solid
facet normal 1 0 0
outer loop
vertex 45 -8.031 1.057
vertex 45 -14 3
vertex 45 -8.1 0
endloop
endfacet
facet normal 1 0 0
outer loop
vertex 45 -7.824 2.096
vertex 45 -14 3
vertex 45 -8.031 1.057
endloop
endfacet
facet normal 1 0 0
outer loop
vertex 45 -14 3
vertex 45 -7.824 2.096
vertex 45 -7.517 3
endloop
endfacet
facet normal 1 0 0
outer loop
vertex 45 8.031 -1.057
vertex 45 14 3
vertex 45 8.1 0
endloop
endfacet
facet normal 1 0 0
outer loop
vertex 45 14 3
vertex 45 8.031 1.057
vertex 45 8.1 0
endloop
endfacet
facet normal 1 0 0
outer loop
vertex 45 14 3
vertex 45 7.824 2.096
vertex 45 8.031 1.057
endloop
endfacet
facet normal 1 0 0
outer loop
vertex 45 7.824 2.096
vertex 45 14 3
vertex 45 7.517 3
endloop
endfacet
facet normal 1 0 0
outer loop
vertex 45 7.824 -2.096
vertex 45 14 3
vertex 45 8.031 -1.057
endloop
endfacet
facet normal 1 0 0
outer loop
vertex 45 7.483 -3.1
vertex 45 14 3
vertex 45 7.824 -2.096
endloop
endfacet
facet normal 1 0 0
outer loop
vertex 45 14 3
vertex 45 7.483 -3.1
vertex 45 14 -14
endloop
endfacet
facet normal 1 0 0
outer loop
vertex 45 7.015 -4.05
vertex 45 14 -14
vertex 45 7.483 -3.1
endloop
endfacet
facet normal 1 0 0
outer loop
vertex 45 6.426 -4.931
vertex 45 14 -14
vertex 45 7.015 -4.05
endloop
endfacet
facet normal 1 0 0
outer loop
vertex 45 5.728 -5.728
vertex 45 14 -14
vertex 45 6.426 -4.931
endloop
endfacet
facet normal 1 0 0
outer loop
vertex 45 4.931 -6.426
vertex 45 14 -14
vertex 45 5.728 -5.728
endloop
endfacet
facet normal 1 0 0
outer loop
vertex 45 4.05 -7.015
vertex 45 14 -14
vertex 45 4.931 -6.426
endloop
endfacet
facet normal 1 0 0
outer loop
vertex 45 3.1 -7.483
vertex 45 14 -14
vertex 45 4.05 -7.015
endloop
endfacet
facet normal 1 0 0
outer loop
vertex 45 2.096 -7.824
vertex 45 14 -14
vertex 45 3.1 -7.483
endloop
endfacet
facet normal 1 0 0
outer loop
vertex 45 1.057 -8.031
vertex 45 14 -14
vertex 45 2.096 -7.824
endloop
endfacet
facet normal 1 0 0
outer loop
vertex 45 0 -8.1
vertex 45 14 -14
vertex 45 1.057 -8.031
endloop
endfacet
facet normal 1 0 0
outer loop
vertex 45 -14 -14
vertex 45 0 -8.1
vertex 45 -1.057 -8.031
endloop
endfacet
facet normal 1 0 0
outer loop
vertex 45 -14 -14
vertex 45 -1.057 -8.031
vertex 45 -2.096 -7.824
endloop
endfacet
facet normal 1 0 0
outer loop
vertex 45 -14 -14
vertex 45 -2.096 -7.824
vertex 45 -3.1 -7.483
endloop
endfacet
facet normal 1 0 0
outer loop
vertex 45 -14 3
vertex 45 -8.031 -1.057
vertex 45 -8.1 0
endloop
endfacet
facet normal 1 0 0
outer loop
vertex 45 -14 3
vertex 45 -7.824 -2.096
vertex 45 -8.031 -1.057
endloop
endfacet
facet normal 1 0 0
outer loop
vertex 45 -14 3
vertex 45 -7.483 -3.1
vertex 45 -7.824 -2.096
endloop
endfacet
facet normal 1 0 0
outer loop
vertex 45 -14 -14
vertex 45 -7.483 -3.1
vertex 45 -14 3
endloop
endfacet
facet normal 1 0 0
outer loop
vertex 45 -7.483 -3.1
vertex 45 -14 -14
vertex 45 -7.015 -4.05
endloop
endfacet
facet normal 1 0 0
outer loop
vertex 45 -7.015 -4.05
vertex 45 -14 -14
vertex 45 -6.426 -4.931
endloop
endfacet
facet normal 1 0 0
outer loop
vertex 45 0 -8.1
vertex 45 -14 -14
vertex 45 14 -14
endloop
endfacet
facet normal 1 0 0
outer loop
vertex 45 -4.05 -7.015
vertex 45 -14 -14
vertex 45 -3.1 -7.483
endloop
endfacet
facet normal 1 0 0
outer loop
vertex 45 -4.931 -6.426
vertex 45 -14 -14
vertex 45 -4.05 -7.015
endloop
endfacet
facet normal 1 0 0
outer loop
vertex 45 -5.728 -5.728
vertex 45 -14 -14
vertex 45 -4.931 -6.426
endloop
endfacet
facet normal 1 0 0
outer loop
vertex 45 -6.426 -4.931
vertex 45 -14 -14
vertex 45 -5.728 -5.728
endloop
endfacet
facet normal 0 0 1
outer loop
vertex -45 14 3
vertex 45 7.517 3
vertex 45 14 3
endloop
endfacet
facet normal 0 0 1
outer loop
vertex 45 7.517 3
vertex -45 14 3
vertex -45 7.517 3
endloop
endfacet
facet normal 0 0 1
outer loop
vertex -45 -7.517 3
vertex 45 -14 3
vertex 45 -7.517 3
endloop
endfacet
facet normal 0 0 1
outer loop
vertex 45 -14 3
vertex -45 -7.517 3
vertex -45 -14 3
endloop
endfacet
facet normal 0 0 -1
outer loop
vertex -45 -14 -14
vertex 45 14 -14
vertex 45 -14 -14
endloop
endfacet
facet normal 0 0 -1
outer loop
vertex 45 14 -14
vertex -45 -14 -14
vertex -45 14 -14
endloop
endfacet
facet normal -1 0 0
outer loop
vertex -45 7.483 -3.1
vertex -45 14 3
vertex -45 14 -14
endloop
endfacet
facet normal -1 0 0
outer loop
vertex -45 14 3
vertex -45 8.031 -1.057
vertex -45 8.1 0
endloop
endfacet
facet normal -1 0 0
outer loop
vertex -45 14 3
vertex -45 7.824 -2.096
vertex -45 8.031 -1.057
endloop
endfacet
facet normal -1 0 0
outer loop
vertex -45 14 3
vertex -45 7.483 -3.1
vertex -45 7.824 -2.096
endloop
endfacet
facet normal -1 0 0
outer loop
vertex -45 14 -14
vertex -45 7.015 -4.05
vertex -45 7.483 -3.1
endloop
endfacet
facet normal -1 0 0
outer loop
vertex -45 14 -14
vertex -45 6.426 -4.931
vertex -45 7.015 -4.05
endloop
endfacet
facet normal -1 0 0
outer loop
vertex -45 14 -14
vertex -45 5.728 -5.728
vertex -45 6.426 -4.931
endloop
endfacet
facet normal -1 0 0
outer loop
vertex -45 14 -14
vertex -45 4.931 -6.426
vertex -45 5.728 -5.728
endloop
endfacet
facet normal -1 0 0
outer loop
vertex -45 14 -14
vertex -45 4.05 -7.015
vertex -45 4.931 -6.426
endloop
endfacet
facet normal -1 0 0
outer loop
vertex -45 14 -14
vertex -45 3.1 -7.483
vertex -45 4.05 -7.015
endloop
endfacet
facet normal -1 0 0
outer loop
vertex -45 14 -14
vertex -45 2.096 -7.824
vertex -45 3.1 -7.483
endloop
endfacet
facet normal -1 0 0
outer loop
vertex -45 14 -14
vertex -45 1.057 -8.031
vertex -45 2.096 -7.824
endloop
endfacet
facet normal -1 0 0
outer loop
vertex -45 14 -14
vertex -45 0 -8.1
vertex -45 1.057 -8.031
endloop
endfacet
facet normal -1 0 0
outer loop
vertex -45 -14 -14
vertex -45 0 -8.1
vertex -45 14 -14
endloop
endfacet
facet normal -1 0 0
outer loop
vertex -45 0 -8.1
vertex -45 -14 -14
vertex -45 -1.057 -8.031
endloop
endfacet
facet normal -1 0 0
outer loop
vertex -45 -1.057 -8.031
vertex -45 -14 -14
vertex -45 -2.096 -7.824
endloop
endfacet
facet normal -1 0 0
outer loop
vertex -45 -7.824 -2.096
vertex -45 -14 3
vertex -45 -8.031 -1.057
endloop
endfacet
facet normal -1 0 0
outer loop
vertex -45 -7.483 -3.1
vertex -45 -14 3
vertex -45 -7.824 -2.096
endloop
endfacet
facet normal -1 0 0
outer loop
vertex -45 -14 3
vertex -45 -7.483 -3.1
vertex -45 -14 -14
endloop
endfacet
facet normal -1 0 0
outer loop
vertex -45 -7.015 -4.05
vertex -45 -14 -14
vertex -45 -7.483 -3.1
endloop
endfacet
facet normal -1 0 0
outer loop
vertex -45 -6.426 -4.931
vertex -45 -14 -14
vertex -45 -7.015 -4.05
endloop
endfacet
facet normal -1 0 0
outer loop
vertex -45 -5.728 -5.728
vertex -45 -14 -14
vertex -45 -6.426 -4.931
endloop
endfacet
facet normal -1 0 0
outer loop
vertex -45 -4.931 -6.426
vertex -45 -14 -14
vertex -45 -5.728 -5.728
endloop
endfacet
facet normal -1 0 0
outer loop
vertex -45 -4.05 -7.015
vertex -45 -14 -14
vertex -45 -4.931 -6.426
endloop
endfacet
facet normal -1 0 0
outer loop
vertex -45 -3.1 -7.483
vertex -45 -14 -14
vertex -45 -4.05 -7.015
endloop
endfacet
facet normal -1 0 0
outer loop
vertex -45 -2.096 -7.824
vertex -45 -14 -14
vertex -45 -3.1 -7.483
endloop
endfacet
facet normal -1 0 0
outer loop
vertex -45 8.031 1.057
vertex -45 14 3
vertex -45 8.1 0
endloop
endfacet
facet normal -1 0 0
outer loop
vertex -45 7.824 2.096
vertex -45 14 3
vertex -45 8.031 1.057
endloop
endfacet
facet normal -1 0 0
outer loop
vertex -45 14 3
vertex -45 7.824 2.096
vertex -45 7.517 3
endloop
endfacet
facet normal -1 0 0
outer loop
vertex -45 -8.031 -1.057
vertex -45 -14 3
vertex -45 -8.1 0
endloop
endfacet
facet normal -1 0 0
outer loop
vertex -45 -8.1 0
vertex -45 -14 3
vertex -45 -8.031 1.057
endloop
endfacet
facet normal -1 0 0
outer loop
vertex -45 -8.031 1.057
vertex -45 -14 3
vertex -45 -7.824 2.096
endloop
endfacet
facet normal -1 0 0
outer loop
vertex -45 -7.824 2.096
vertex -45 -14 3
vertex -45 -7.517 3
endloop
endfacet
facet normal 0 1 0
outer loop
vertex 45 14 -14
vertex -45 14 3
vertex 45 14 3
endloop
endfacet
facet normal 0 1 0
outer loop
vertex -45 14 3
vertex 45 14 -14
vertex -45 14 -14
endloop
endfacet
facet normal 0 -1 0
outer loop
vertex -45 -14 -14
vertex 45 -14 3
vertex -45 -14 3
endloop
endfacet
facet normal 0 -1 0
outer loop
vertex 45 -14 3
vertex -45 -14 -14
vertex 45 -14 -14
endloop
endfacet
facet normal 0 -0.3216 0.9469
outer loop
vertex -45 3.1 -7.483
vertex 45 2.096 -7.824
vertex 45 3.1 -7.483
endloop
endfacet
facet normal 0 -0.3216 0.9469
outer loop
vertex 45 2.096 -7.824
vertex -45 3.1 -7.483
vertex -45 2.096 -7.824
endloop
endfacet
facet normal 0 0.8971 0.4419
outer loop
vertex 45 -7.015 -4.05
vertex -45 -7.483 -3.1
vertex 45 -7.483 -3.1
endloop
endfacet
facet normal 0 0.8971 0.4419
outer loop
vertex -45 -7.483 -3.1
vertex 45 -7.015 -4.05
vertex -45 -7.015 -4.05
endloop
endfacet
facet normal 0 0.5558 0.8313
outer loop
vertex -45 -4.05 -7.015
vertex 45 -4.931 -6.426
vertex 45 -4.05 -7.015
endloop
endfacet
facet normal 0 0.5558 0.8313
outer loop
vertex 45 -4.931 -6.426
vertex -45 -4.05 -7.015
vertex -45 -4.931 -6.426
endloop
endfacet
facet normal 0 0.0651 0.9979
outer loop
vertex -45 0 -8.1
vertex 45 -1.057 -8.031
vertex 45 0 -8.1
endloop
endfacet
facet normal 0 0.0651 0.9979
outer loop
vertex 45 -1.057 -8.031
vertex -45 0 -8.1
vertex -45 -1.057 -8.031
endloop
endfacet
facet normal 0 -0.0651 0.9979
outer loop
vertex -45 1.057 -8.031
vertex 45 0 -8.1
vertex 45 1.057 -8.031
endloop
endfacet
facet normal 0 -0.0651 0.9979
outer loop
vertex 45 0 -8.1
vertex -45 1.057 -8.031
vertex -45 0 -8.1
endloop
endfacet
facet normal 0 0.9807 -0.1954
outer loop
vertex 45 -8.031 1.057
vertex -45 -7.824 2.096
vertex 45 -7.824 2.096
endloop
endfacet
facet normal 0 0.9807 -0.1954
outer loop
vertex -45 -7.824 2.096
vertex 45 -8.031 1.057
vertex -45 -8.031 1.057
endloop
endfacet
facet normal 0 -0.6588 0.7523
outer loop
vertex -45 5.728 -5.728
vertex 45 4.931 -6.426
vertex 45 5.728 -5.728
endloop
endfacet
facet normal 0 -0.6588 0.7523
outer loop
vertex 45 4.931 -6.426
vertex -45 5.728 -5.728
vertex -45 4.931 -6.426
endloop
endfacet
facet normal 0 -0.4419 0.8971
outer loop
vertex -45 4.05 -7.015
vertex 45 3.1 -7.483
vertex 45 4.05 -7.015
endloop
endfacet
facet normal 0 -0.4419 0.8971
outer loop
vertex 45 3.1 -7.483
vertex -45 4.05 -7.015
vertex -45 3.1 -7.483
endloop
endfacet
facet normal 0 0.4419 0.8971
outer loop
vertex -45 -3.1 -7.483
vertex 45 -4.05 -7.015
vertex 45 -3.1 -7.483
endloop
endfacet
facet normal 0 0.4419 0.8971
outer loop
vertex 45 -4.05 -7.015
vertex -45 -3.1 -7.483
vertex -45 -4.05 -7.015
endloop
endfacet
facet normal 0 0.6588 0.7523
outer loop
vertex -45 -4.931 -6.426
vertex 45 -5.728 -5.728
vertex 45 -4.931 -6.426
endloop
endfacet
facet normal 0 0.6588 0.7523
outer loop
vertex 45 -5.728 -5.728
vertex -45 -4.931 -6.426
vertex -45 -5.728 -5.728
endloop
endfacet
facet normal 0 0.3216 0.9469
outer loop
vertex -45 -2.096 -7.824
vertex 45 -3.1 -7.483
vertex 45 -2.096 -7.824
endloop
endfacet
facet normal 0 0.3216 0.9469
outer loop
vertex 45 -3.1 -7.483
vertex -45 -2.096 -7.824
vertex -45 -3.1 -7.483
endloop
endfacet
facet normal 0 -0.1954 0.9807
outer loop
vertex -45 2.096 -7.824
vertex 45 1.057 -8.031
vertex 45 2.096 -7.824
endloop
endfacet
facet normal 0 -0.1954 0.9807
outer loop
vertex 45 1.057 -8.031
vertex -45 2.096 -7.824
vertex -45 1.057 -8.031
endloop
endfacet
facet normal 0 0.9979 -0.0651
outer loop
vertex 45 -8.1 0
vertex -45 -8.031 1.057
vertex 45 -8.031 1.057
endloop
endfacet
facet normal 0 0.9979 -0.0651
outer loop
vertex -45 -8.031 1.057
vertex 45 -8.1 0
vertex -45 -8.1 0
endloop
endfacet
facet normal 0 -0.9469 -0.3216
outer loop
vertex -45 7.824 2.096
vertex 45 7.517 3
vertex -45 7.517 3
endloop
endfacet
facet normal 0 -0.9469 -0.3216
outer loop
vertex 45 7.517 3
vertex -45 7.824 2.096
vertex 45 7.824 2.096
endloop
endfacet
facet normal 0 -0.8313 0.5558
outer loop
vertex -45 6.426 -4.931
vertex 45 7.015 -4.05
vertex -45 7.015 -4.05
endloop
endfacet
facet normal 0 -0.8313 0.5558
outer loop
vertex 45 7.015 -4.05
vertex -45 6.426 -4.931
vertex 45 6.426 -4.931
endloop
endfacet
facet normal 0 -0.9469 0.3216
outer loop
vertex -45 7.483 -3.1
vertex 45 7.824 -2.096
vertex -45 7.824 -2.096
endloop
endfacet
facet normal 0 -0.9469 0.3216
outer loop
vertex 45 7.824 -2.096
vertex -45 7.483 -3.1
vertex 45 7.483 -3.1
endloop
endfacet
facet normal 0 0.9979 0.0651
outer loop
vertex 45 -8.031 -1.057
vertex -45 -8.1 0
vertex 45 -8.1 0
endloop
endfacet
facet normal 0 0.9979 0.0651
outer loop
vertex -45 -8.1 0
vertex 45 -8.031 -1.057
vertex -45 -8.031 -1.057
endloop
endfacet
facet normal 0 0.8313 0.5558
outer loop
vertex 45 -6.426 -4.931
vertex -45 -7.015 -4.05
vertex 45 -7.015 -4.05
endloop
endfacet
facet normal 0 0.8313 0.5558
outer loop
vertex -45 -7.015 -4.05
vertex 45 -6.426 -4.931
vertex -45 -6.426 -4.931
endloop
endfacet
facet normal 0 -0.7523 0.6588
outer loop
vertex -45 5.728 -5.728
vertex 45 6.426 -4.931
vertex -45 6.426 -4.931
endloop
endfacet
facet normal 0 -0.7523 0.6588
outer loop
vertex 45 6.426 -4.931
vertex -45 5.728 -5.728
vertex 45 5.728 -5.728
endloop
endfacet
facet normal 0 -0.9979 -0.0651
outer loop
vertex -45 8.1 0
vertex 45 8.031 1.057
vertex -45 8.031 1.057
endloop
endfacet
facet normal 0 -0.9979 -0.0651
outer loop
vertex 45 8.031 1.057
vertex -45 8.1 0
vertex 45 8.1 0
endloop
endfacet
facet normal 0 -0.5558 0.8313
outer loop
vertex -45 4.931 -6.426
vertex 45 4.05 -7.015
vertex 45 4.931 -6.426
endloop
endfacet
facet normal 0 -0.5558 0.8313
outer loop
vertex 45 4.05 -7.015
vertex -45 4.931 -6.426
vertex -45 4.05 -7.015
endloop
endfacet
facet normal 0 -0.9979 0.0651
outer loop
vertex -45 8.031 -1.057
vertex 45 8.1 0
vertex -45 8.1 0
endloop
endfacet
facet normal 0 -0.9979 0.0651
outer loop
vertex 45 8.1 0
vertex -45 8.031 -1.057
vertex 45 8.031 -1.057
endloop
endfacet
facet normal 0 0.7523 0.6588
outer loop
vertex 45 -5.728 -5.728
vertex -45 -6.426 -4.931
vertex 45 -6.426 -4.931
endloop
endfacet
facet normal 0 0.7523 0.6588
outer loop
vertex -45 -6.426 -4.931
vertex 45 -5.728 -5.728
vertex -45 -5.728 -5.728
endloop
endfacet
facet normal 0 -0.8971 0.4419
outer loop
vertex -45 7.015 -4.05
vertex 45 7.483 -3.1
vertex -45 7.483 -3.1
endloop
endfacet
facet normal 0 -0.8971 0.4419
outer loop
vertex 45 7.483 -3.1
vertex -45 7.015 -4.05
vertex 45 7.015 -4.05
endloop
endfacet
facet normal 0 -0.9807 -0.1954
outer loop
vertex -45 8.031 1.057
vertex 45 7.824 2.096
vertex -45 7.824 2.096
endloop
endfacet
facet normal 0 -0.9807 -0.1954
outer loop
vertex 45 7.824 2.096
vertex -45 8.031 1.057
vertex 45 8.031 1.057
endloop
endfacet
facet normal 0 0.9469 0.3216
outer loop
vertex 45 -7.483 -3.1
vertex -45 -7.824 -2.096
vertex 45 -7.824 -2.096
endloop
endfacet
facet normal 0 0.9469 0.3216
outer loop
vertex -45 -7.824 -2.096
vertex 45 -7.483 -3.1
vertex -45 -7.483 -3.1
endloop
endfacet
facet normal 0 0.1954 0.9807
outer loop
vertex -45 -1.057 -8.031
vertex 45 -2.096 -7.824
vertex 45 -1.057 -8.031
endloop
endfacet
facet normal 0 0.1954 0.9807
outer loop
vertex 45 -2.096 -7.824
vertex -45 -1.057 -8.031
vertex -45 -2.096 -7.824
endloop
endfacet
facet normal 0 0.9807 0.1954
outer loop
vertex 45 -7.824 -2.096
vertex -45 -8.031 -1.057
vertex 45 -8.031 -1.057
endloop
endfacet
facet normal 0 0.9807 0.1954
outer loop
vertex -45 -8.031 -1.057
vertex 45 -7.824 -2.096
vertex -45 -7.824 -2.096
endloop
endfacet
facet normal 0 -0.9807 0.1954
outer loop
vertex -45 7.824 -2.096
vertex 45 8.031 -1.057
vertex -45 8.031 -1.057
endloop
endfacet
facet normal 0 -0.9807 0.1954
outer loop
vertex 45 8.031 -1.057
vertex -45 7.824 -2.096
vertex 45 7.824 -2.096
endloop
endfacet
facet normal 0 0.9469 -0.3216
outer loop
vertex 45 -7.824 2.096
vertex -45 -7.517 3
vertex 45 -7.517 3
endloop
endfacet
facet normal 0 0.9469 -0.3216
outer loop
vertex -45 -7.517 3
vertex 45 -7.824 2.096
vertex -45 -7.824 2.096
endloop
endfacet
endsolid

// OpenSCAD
// file: ../common/ds_lib.scad
// DronSwarm · librería común de piezas del frame (S07-S08). Unidades: mm.
//
// Reglas (ADR-003): sin hull()/minkowski()/offset() — FreeCAD los convierte en malla y el STEP deja de ser un
// sólido válido. Las formas redondeadas se arman con uniones de cubos y cilindros. El importador CSG de FreeCAD
// también falla con booleanas 2D y con varios operandos agrupados bajo una sola transformación: cada grupo de
// agujeros debe ser hijo directo del difference(), con su propio translate.
//
// Interfaz de motor DronSwarm (DMI, ADR-011): placa con 4 ranuras radiales a 90°, de modo que el mismo soporte
// acepta varios patrones comerciales y, más adelante, el motor propio (S17+) se diseña para caer en el mismo rango.
//   DMI-S: 4×M3, círculo de tornillos Ø16-Ø25 (motores 28xx-41xx, ≤ 600 W)
//   DMI-L: 4×M4, círculo de tornillos Ø30-Ø42 (motores 50xx-70xx, ≤ 2 kW)

$fn = 48;

M3 = 3.3; M3_HEAD = 6.0; M3_NUT = 6.4;     // pasante, cabeza, tuerca (entre caras + juego)
M4 = 4.4; M4_HEAD = 7.5;
M5 = 5.4;

function dmi_bolt(iface) = iface == "L" ? M4 : M3;
function dmi_r(iface) = iface == "L" ? [15, 21] : [8, 12.5];   // radio mínimo y máximo de las ranuras
function dmi_plate_d(iface) = iface == "L" ? 56 : 36;
function dmi_center(iface) = iface == "L" ? 16 : 10;            // eje, seguro y paso de cables

// Rectángulo con esquinas redondeadas (2D) y su extrusión
module rrect2d(size, r) {
    r2 = min(r, size[0] / 2 - 0.01, size[1] / 2 - 0.01);
    union() {
        translate([r2, 0]) square([size[0] - 2 * r2, size[1]]);
        translate([0, r2]) square([size[0], size[1] - 2 * r2]);
        for (x = [r2, size[0] - r2], y = [r2, size[1] - r2]) translate([x, y]) circle(r = r2);
    }
}
// Caja redondeada con primitivas 3D (sin booleanas 2D: el importador CSG de FreeCAD falla con ellas)
module rbox(size, r) {
    r2 = min(r, size[0] / 2 - 0.01, size[1] / 2 - 0.01);
    union() {
        translate([r2, 0, 0]) cube([size[0] - 2 * r2, size[1], size[2]]);
        translate([0, r2, 0]) cube([size[0], size[1] - 2 * r2, size[2]]);
        for (x = [r2, size[0] - r2], y = [r2, size[1] - r2]) translate([x, y, 0]) cylinder(r = r2, h = size[2]);
    }
}
module crbox(size, r) { translate([-size[0] / 2, -size[1] / 2, 0]) rbox(size, r); }   // centrado en x/y

// Ranura (2D) entre dos puntos sobre el eje x
module slot2d(r0, r1, w) {
    union() {
        translate([r0, -w / 2]) square([r1 - r0, w]);
        translate([r0, 0]) circle(d = w);
        translate([r1, 0]) circle(d = w);
    }
}

// Agujeros de la interfaz de motor (para restar de una placa de espesor t)
module slot3d(r0, r1, w, h) {
    union() {
        translate([r0, -w / 2, 0]) cube([r1 - r0, w, h]);
        translate([r0, 0, 0]) cylinder(d = w, h = h);
        translate([r1, 0, 0]) cylinder(d = w, h = h);
    }
}
module dmi_holes(iface, t) {
    r = dmi_r(iface);
    translate([0, 0, -1]) union() {
        cylinder(d = dmi_center(iface), h = t + 2);
        for (a = [45, 135, 225, 315]) rotate(a) slot3d(r[0], r[1], dmi_bolt(iface), t + 2);
    }
}

// Soporte de motor en la punta del brazo: manguito sobre el tubo + placa DMI arriba
//   el tubo entra por -x; la placa queda centrada en el eje del motor (origen), cara superior en z = 0
module motor_mount(tube_d, iface = "S", sleeve = 34, wall = 3.5) {
    od = tube_d + 2 * wall;
    pd = dmi_plate_d(iface);
    pt = iface == "L" ? 6 : 4;
    zc = -pt - tube_d / 2 - 1;                 // eje del tubo bajo la placa
    difference() {
        union() {
            translate([0, 0, -pt]) cylinder(d = pd, h = pt);                         // placa DMI
            translate([-sleeve - pd / 2 + 6, 0, zc]) rotate([0, 90, 0])
                cylinder(d = od, h = sleeve + pd / 2 - 6 + 4);                       // manguito
            translate([-sleeve - pd / 2 + 6, -od / 2, zc]) cube([sleeve + pd / 2 - 2, od, -zc - pt + 0.01]);  // alma
            translate([-sleeve - pd / 2 + 6, -5, zc - od / 2 - 7]) cube([sleeve, 10, 8]);   // oreja de apriete
        }
        dmi_holes(iface, pt + 0.02, $fn = 32);
        translate([-sleeve - pd / 2 + 5, 0, zc]) rotate([0, 90, 0]) cylinder(d = tube_d + 0.3, h = sleeve + pd / 2 - 3); // tubo
        translate([-sleeve - pd / 2 + 4, -1, zc - od / 2 - 8]) cube([sleeve + 1, 2, od / 2 + 6]);   // ranura de apriete
        for (x = [0.3, 0.75]) translate([-sleeve - pd / 2 + 6 + x * sleeve, 0, zc - od / 2 - 3])
            rotate([90, 0, 0]) cylinder(d = M3, h = 30, center = true);                // tornillos de apriete
        translate([-pd / 2 - 2, 0, zc]) rotate([0, 90, 0]) cylinder(d = 7, h = pd);   // salida de cables del tubo
    }
}

// Bloque de brazo entre las dos placas centrales (impreso PA12-CF): sujeta el tubo y separa las placas.
//   el tubo sale por +x desde el origen; el bloque ocupa x ∈ [-len, 0], altura = gap
module arm_block(tube_d, gap, len = 40, width = 0, bolt = M3) {
    w = width > 0 ? width : tube_d + 14;
    difference() {
        translate([-len, -w / 2, 0]) rbox([len, w, gap], 2);
        translate([-len - 1, 0, gap / 2]) rotate([0, 90, 0]) cylinder(d = tube_d + 0.2, h = len + 2);   // tubo
        translate([-len - 1, -0.75, gap / 2]) cube([len + 2, 1.5, gap / 2 + 1]);                        // ranura de apriete
        for (p = arm_block_bolts(tube_d, len, w)) translate([p[0], p[1], -1]) cylinder(d = bolt, h = gap + 2);
        translate([-len * 0.5, 0, gap * 0.78]) rotate([90, 0, 0]) cylinder(d = M3, h = w + 2, center = true);  // apriete
    }
}
function arm_block_bolts(tube_d, len, w) =
    [for (x = [-len + 6, -6], y = [-(w / 2 - 3.6), w / 2 - 3.6]) [x, y]];

// Patrón de controladora de vuelo (agujeros M3 en cuadrado)
module fc_holes(pattern, t) {
    for (x = [-1, 1], y = [-1, 1]) translate([x * pattern / 2, y * pattern / 2, -1]) cylinder(d = M3, h = t + 2);
}
// file: ds_d_params.scad
// DS-D · parámetros generados por tools/cad/gen_cad_params.py el 2026-10-19
// desde engineering/data/results (spec v1). No editar a mano: regenerar. Unidades: mm, kg.

vehicle = "DS-D";
rotors = 6;
wheelbase = 1453;
arm_radius = 726.5;
prop_d = 660.4;
tube_od = 22;
tube_wall = 1.5;
arm_len = 545;
plate_d = 363.2;
plate_t = 3;
plate_gap = 28;
motor_iface = "L";
battery_dims = [220, 134.4, 76.2];
battery = "12S5P P42A";
leg_h = 420;
fold_arms = true;
mtow_kg = 15.61;
motor_mass_kg = 0.345;
fc_pattern = 30.5;
payload_box = [300, 240, 220];
payload_kg = 5;
// file: ds_d_frame.scad
// DS-D · geometría compartida del frame: posiciones derivadas de los parámetros (spec v1). Unidades: mm.
// Ejes: x adelante, y izquierda, z arriba. z = 0 es la cara superior de la placa inferior.
// Hexa con brazos desmontables (bloques con levas entre las placas, ADR-012), batería y carcasa arriba,
// mecanismo de liberación de la carga al centro abajo, tren de esquíes.

include <ds_d_params.scad>
use <../common/ds_lib.scad>
include <../common/ds_lib.scad>

arm_angles = [0, 60, 120, 180, 240, 300];      // igual que el SDF/PX4 (rotor 0 adelante)
// Brazos desmontables (ADR-012): el tubo entra en un bloque impreso entre las placas y se fija con 2 levas de
// apriete rápido; los cables del motor tienen un conector en el bloque. Se monta/desmonta sin herramientas.
block_len = 60;
block_w = tube_od + 20;
r_block_out = plate_d / 2 - 3;                  // cara exterior del bloque
tube_insert = 54;                               // el tubo entra hasta un tope interior
tube_z = plate_gap / 2;
tube_start = r_block_out - tube_insert;
tube_len = arm_radius - tube_start - 6;
mm_sleeve = 30;

// Arriba: batería transversal atrás y carcasa adelante. Abajo: liberación al centro, FPV adelante
battery_pos = [-60, 0];
housing_size = [130, 110, 62];
housing_pos = [90, 0];
housing_flange = 10;
housing_bolts = [for (x = [-1, 0, 1], y = [-1, 1]) [housing_pos[0] + x * (housing_size[0] / 2 + 6), y * (housing_size[1] / 2 + 6)]];   // fuera del canal de la junta
battery_tray_bolts = [for (x = [-1, 1], y = [-1, 1]) [battery_pos[0] + x * 50, y * 95]];
release_bolts = [for (x = [-1, 1], y = [-1, 1]) [x * 35, y * 20]];
cable_gland_pos = [housing_pos[0] - housing_size[0] / 2 + 20, 0];
fpv_pos = [plate_d / 2 - 30, 0];

// Tren de esquíes: 4 patas inclinadas desde la placa inferior hasta dos esquíes longitudinales (base ancha)
leg_x = 100;                                    // patas en x = ±leg_x
leg_y_top = 110;                                // arriba, bajo la placa
skid_y = 220;                                   // esquíes en y = ±skid_y
skid_len = 560;
gear_tube = 16;                                 // tubos Ø16×1
gear_wall = 1.0;
ground_z = -leg_h;
skid_z = ground_z + gear_tube / 2 + 6;          // eje del esquí (sobre su zapata de TPU de 6 mm)
gear_mount_h = 30;                              // soporte impreso bajo la placa
// pivotes: el del soporte (bajo la placa) y el de la T (eje del esquí); la pata va de uno a otro
pivot_top = [leg_y_top, -plate_t - 6];
pivot_bot = [skid_y, skid_z];
leg_dy = pivot_bot[0] - pivot_top[0];
leg_dz = pivot_top[1] - pivot_bot[1];
leg_tilt = atan(leg_dy / leg_dz);               // inclinación hacia afuera (en torno a x)
leg_in_top = 4;                                 // el tubo termina 4 mm antes del pivote del soporte
leg_in_bot = 10;                                // y 10 mm después del eje del esquí
leg_len = sqrt(leg_dy * leg_dy + leg_dz * leg_dz) - leg_in_top - leg_in_bot;
gear_mount_bolts = [for (sx = [-1, 1], sy = [-1, 1], d = [[-14, -10], [14, -10], [-14, 10], [14, 10]]) [sx * leg_x + d[0], sy * leg_y_top + d[1]]];

motor_d = motor_iface == "L" ? 62 : 38;
motor_h = motor_iface == "L" ? 36 : 26;
function block_bolts() = [for (x = [-block_len + 7, -block_len / 2, -7], y = [-1, 1]) [x, y * (block_w / 2 - 4.5)]];
// main file
// DS-D · zapata del esquí (impresa TPU 85A, giroide 20 %, ×4): amortigua el aterrizaje y protege el tubo.
// Local: abraza el esquí (eje x en el origen); apoya en el suelo en z = −(gear_tube / 2 + 6).
include <ds_d_frame.scad>
module skid_pad(len = 90) difference() {
    translate([-len / 2, -14, -gear_tube / 2 - 6]) cube([len, 28, gear_tube / 2 + 9]);
    translate([-len / 2 - 1, 0, 0]) rotate([0, 90, 0]) cylinder(d = gear_tube + 0.2, h = len + 2);
    translate([-len / 2 - 1, -gear_tube * 0.3, 0]) cube([len + 2, gear_tube * 0.6, 10]);
}
skid_pad();
